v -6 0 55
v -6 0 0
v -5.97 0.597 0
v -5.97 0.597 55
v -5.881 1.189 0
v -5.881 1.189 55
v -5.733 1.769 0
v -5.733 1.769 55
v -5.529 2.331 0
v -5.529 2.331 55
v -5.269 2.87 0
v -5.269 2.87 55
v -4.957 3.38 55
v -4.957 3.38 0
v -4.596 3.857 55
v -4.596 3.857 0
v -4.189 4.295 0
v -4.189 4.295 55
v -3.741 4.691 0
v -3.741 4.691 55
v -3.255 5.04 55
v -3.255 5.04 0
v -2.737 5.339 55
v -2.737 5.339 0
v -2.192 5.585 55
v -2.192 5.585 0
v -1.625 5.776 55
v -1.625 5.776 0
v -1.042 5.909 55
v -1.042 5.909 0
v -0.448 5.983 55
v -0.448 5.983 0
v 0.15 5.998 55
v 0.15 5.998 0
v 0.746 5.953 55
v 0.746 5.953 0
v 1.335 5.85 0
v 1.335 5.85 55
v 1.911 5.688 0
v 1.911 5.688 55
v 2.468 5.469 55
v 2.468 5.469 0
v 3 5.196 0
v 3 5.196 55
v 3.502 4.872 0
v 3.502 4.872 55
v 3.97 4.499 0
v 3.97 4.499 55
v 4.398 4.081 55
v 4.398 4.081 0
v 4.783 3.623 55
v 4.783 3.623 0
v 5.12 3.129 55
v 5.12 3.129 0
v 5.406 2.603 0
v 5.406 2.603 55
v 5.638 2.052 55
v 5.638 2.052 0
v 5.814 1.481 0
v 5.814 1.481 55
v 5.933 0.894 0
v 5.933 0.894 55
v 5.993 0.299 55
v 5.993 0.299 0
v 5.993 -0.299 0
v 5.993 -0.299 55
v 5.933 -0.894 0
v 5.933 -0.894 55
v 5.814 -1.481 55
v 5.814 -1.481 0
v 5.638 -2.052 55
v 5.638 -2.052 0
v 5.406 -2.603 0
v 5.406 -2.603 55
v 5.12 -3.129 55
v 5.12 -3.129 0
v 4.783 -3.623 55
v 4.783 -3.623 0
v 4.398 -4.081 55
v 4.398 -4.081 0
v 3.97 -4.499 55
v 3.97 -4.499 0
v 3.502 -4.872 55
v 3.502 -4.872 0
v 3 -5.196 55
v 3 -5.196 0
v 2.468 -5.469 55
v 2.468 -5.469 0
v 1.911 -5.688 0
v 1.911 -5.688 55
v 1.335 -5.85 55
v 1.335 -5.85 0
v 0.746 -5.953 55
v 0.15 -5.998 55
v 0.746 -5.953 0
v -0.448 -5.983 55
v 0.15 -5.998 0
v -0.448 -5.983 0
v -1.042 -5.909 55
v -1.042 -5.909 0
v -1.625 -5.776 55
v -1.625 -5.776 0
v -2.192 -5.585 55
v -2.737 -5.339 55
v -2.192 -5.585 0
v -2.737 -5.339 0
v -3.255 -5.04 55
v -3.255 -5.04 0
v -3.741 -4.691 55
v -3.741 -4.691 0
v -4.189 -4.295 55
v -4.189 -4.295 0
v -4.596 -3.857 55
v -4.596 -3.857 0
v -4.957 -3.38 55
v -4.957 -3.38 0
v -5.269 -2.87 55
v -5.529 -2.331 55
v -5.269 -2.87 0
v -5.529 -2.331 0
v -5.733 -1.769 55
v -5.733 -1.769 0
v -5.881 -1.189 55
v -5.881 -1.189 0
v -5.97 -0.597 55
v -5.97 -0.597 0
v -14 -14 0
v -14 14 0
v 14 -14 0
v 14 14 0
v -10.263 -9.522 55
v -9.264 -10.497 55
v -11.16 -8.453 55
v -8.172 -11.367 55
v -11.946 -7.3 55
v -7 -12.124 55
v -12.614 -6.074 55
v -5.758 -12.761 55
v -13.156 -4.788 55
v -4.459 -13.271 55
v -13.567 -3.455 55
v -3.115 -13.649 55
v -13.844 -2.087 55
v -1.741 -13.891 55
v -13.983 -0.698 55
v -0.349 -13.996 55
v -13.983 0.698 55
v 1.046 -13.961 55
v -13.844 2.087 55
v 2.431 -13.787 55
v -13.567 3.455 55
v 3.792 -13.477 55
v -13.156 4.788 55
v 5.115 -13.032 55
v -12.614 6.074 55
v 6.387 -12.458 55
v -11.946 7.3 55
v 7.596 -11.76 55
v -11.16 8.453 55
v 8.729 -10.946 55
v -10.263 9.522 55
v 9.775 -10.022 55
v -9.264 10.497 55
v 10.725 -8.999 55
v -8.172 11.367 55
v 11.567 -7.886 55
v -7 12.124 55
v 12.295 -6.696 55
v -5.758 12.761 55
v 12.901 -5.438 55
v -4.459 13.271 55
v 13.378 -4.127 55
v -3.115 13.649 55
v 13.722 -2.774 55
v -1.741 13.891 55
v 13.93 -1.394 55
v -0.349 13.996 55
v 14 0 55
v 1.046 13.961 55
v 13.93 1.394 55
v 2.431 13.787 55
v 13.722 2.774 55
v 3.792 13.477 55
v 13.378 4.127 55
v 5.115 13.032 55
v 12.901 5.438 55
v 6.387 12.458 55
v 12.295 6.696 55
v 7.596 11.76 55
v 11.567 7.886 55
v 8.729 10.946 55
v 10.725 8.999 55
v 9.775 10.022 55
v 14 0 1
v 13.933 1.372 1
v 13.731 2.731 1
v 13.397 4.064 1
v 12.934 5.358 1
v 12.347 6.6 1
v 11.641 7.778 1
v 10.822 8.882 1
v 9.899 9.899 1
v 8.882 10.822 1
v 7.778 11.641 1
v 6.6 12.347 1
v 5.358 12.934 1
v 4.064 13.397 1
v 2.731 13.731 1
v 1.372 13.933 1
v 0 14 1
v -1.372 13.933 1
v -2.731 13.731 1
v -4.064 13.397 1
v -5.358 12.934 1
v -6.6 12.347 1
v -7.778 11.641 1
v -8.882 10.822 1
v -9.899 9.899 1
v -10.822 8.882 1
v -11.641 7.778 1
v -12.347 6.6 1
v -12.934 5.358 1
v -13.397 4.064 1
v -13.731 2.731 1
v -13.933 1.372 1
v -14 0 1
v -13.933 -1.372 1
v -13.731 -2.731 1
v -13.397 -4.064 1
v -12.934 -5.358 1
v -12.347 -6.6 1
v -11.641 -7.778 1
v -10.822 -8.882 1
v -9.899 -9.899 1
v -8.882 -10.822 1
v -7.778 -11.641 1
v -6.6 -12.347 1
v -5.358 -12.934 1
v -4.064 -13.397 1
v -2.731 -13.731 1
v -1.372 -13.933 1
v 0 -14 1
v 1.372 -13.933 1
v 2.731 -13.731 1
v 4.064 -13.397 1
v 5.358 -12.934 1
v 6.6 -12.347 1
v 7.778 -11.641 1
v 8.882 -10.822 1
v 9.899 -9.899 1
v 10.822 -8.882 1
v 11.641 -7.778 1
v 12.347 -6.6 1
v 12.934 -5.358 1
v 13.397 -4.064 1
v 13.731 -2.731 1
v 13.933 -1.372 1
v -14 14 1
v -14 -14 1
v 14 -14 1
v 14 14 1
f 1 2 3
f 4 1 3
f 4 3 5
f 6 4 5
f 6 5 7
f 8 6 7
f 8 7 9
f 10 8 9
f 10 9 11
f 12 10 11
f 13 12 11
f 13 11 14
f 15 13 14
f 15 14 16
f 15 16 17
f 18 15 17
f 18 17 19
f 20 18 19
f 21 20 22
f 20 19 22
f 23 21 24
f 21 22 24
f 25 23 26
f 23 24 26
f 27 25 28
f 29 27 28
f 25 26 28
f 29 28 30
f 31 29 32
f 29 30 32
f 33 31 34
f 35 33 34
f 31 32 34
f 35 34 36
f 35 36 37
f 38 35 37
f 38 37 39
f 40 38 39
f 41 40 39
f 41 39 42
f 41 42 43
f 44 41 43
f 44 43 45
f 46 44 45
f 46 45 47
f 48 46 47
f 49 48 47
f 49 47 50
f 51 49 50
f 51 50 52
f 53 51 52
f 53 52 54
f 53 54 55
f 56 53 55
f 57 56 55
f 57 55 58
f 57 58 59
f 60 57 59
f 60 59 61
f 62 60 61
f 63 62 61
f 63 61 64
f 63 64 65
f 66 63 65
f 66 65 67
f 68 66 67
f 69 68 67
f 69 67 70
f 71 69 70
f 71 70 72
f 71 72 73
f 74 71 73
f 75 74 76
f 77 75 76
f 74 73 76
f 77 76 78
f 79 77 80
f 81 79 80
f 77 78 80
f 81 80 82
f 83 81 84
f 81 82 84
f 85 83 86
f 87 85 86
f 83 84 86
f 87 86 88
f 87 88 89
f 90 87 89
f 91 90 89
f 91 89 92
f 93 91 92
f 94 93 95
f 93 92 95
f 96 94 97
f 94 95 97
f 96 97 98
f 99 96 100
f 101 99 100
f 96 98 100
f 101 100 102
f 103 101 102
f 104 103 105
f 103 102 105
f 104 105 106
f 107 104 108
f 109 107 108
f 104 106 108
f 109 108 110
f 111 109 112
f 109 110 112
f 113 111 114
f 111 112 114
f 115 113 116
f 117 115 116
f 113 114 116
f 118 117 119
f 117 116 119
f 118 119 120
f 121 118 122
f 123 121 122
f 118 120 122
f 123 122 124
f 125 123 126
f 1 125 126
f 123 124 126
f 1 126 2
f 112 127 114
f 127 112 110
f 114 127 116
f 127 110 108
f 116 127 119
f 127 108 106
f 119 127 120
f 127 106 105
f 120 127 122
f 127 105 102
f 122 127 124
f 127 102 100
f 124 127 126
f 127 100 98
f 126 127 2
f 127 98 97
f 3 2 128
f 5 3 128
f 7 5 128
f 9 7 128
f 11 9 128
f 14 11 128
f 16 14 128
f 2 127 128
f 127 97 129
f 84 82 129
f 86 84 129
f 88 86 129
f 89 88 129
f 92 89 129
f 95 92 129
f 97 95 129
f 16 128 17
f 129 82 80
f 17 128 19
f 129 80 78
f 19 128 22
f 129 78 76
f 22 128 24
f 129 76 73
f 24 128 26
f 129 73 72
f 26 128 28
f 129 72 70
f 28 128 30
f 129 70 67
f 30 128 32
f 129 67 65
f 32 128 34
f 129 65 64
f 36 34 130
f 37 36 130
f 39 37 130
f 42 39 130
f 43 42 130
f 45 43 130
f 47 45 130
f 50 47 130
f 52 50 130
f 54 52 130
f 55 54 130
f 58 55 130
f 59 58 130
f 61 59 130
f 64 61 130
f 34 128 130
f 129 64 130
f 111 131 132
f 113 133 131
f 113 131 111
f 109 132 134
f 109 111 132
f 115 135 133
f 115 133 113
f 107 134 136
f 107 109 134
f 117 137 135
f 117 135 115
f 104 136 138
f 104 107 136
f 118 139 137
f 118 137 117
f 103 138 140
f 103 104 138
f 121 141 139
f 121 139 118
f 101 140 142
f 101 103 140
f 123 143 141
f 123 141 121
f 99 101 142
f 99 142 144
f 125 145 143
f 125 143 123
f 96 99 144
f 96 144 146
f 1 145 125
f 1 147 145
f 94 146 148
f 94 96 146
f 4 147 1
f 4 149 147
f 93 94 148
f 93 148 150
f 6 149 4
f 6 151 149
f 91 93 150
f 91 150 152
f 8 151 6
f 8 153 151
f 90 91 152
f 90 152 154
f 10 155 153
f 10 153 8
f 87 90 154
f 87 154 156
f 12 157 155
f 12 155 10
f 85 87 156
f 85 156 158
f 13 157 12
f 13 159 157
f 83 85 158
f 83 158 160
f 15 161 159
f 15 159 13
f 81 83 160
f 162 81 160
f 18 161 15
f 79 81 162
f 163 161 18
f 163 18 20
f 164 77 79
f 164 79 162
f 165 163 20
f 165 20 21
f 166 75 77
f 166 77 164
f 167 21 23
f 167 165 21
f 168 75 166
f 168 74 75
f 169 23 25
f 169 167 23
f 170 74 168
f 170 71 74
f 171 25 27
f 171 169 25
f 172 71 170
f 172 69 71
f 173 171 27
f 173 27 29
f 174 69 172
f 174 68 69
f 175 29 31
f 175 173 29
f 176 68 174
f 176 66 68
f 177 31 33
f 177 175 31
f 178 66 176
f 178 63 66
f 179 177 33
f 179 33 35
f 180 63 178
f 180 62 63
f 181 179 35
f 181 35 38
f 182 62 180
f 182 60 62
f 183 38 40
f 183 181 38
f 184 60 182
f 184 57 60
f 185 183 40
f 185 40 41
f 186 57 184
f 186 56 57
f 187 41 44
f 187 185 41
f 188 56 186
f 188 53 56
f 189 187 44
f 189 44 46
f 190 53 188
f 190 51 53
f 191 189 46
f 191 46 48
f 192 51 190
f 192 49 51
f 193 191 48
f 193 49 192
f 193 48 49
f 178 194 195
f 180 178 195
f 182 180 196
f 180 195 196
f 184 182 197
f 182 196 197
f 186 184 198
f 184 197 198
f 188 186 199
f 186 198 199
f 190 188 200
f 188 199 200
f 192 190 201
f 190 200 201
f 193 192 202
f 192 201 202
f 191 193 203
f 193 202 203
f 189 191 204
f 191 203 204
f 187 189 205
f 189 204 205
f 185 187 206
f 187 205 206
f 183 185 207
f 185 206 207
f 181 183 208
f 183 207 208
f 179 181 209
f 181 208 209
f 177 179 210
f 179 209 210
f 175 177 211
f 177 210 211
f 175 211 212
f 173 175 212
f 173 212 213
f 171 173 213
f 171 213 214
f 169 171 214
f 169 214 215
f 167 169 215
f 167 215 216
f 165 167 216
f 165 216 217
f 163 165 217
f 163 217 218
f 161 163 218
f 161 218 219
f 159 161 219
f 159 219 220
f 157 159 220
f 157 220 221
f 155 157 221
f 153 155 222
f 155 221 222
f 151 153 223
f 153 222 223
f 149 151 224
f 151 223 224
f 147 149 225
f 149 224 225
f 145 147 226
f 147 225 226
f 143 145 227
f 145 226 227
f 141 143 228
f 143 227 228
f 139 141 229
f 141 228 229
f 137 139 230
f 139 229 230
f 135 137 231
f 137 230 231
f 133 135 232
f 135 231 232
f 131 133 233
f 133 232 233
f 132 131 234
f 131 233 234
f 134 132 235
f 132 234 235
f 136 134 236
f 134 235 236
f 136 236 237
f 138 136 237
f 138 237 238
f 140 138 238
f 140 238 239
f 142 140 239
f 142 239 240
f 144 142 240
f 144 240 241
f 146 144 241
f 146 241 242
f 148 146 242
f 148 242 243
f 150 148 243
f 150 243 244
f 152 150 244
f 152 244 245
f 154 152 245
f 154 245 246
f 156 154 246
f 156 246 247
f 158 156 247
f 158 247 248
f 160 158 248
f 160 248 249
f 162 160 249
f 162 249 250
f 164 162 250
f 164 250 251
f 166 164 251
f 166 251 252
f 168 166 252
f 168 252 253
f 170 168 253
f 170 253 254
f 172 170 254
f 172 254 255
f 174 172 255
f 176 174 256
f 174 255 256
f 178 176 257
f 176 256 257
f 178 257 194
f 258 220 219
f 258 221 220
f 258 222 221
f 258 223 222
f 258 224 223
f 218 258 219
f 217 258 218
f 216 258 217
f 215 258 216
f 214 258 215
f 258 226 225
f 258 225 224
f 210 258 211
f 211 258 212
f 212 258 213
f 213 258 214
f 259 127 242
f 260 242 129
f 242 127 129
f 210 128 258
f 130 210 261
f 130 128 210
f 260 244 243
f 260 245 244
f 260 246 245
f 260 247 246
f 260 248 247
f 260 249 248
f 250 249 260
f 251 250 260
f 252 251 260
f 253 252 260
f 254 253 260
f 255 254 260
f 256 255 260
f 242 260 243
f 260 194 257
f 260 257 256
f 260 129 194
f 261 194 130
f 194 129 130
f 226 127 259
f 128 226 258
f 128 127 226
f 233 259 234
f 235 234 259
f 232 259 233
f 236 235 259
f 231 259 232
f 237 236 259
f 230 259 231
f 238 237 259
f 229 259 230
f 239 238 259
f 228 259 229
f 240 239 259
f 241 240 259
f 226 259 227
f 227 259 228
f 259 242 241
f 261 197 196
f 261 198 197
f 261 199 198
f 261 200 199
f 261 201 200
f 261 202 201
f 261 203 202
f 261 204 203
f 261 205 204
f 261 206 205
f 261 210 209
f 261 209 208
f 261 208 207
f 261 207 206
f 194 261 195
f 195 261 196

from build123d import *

# Parameters (mm, degrees)
SKETCH1_W           = 28
SKETCH1_H           = 28
BOSS_EXTRUDE1_DEPTH = 1
SKETCH2_R           = 14
BOSS_EXTRUDE2_DEPTH = 54
SKETCH3_R           = 6
CUT_EXTRUDE1_DEPTH  = 59.455110983


with BuildPart() as part:
    # Sketch1 → Boss-Extrude1 (new body)
    with BuildSketch(Plane.XY):
        Rectangle(SKETCH1_W, SKETCH1_H)
    extrude(amount=BOSS_EXTRUDE1_DEPTH)

    # Sketch2 → Boss-Extrude2 (add)
    with BuildSketch(Plane.XY.offset(1)):
        Circle(SKETCH2_R)
    extrude(amount=BOSS_EXTRUDE2_DEPTH)

    # Sketch3 → Cut-Extrude1 (cut, through all)
    with BuildSketch(Plane(origin=(0, 0, 0), x_dir=(-1, 0, 0), z_dir=(0, 0, -1))):
        Circle(SKETCH3_R)
    extrude(amount=-CUT_EXTRUDE1_DEPTH, mode=Mode.SUBTRACT)


solid = part.part
